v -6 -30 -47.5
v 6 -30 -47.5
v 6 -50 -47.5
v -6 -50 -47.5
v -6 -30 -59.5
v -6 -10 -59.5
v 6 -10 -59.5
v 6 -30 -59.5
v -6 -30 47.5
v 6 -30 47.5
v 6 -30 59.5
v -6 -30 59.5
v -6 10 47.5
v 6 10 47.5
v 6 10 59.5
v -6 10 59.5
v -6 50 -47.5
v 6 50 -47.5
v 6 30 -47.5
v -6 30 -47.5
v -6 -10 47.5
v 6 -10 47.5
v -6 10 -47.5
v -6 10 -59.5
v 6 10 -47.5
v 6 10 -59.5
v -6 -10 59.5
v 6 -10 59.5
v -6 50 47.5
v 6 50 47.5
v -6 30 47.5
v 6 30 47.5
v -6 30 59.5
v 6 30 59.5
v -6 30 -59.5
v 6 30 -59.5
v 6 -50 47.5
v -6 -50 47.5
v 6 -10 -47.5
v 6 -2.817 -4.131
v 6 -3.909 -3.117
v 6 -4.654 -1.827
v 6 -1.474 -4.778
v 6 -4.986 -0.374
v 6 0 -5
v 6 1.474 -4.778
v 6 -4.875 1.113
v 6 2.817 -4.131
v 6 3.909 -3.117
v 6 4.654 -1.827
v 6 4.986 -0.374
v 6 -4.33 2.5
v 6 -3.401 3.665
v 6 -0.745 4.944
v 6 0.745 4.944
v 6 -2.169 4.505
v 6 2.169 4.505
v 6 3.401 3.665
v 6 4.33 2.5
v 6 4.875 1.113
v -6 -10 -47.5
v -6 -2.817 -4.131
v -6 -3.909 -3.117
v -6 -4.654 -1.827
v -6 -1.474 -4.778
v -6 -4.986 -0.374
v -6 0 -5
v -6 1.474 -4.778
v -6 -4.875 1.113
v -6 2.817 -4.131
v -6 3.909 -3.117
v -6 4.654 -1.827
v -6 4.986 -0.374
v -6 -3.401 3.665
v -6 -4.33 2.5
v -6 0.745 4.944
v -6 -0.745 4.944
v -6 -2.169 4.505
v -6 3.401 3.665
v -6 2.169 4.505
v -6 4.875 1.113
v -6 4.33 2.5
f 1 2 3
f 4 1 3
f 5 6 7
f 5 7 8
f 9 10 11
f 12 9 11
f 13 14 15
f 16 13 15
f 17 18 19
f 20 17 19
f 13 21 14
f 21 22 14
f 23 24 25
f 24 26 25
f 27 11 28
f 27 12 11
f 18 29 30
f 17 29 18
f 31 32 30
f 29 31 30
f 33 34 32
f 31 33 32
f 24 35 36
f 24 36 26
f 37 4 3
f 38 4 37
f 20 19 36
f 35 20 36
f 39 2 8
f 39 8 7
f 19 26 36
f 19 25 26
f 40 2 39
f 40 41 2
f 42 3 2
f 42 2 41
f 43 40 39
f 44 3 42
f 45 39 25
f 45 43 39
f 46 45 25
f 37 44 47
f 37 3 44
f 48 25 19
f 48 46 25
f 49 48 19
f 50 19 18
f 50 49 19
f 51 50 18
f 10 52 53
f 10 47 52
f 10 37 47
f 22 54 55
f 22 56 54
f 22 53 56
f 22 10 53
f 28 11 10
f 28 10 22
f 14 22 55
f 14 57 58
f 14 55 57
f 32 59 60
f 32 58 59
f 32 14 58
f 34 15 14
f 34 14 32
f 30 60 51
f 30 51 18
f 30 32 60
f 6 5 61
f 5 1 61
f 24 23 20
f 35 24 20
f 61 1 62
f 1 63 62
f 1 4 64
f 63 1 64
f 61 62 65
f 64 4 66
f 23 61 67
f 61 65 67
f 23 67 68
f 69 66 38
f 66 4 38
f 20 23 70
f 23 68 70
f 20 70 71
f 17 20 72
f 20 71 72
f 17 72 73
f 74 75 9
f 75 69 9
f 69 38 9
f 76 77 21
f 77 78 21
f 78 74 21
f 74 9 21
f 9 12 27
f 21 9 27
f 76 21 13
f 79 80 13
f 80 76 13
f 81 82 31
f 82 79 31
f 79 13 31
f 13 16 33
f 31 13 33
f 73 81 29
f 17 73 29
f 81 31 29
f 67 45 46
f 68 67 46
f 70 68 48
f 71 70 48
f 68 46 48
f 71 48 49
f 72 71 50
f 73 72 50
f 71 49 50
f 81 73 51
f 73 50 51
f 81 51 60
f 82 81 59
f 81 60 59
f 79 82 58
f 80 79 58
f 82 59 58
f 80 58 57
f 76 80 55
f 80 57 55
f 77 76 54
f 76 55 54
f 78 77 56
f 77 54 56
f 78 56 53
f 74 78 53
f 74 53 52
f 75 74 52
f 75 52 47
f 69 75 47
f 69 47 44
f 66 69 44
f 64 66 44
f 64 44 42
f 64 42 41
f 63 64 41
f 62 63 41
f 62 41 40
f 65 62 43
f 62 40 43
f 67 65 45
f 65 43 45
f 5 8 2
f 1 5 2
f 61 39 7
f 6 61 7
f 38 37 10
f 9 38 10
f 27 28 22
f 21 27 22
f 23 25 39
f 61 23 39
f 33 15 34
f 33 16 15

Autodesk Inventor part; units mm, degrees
ref_plane "YZ Plane" through (0, 0, 0) normal (1, 0, 0) x (0, 1, 0)
ref_plane "XZ Plane" through (0, 0, 0) normal (0, 1, 0) x (-1, 0, 0)
ref_plane "XY Plane" through (0, 0, 0) normal (0, 0, 1) x (1, 0, 0)
sketch "Sketch6" plane through (0, 0, 0) normal (1, 0, 0) x (0, 1, 0)
  line L0 (-50, 59.5) -> (50, 59.5)
  line L1 (50, 59.5) -> (50, -59.5)
  line L2 (50, -59.5) -> (-50, -59.5)
  line L3 (-50, -59.5) -> (-50, 59.5)
  line L4 (-50, 59.5) -> (50, -59.5) construction
  line L5 (50, 59.5) -> (-50, -59.5) construction
  point P0 (0, 0)
  dimension "d28" = 100
  dimension "d29" = 119
extrude "Extrusion5" add sketch "Sketch6" along normal mid plane 12
sketch "Sketch7" plane through (6, 0, 0) normal (1, 0, 0) x (0, 0, -1)
  line L0 (-59.5, 50) -> (-59.5, -50) projected
  line L1 (-59.5, -50) -> (-47.5, -50)
  line L2 (-47.5, -50) -> (-47.5, -30)
  line L3 (-47.5, -30) -> (-59.5, -30)
  line L4 (-59.5, -30) -> (-59.5, -50)
  line L5 (-59.5, -50) -> (-59.5, 50) projected
  line L6 (-59.5, -10) -> (-47.5, -10)
  line L7 (-47.5, -10) -> (-47.5, 10)
  line L8 (-47.5, 10) -> (-59.5, 10)
  line L9 (-59.5, 10) -> (-59.5, -10)
  line L10 (-59.5, 30) -> (-47.5, 30)
  line L11 (-47.5, 30) -> (-47.5, 50)
  line L12 (-47.5, 50) -> (-59.5, 50)
  line L13 (-59.5, 50) -> (-59.5, 30)
  point P0 (0, 0)
  dimension "d32" = 12
  dimension "d33" = 20
  dimension "d34" = 12
  dimension "d35" = 20
  dimension "d36" = 20
  dimension "d39" = 12
  dimension "d40" = 20
  dimension "d41" = 20
extrude "Extrusion6" cut sketch "Sketch7" against normal through all
mirror "Mirror2" about plane through (0, 0, 0) normal (0, 0, 1) of "Extrusion6"
sketch "Sketch8" plane through (6, 0, 0) normal (1, 0, 0) x (0, 0, -1)
  circle A0 centre (0, 0) radius 5
  dimension "d44" = 10
extrude "Extrusion7" cut sketch "Sketch8" against normal through all
properties part number "FRONT V2" material "Wood (Cherry)"
